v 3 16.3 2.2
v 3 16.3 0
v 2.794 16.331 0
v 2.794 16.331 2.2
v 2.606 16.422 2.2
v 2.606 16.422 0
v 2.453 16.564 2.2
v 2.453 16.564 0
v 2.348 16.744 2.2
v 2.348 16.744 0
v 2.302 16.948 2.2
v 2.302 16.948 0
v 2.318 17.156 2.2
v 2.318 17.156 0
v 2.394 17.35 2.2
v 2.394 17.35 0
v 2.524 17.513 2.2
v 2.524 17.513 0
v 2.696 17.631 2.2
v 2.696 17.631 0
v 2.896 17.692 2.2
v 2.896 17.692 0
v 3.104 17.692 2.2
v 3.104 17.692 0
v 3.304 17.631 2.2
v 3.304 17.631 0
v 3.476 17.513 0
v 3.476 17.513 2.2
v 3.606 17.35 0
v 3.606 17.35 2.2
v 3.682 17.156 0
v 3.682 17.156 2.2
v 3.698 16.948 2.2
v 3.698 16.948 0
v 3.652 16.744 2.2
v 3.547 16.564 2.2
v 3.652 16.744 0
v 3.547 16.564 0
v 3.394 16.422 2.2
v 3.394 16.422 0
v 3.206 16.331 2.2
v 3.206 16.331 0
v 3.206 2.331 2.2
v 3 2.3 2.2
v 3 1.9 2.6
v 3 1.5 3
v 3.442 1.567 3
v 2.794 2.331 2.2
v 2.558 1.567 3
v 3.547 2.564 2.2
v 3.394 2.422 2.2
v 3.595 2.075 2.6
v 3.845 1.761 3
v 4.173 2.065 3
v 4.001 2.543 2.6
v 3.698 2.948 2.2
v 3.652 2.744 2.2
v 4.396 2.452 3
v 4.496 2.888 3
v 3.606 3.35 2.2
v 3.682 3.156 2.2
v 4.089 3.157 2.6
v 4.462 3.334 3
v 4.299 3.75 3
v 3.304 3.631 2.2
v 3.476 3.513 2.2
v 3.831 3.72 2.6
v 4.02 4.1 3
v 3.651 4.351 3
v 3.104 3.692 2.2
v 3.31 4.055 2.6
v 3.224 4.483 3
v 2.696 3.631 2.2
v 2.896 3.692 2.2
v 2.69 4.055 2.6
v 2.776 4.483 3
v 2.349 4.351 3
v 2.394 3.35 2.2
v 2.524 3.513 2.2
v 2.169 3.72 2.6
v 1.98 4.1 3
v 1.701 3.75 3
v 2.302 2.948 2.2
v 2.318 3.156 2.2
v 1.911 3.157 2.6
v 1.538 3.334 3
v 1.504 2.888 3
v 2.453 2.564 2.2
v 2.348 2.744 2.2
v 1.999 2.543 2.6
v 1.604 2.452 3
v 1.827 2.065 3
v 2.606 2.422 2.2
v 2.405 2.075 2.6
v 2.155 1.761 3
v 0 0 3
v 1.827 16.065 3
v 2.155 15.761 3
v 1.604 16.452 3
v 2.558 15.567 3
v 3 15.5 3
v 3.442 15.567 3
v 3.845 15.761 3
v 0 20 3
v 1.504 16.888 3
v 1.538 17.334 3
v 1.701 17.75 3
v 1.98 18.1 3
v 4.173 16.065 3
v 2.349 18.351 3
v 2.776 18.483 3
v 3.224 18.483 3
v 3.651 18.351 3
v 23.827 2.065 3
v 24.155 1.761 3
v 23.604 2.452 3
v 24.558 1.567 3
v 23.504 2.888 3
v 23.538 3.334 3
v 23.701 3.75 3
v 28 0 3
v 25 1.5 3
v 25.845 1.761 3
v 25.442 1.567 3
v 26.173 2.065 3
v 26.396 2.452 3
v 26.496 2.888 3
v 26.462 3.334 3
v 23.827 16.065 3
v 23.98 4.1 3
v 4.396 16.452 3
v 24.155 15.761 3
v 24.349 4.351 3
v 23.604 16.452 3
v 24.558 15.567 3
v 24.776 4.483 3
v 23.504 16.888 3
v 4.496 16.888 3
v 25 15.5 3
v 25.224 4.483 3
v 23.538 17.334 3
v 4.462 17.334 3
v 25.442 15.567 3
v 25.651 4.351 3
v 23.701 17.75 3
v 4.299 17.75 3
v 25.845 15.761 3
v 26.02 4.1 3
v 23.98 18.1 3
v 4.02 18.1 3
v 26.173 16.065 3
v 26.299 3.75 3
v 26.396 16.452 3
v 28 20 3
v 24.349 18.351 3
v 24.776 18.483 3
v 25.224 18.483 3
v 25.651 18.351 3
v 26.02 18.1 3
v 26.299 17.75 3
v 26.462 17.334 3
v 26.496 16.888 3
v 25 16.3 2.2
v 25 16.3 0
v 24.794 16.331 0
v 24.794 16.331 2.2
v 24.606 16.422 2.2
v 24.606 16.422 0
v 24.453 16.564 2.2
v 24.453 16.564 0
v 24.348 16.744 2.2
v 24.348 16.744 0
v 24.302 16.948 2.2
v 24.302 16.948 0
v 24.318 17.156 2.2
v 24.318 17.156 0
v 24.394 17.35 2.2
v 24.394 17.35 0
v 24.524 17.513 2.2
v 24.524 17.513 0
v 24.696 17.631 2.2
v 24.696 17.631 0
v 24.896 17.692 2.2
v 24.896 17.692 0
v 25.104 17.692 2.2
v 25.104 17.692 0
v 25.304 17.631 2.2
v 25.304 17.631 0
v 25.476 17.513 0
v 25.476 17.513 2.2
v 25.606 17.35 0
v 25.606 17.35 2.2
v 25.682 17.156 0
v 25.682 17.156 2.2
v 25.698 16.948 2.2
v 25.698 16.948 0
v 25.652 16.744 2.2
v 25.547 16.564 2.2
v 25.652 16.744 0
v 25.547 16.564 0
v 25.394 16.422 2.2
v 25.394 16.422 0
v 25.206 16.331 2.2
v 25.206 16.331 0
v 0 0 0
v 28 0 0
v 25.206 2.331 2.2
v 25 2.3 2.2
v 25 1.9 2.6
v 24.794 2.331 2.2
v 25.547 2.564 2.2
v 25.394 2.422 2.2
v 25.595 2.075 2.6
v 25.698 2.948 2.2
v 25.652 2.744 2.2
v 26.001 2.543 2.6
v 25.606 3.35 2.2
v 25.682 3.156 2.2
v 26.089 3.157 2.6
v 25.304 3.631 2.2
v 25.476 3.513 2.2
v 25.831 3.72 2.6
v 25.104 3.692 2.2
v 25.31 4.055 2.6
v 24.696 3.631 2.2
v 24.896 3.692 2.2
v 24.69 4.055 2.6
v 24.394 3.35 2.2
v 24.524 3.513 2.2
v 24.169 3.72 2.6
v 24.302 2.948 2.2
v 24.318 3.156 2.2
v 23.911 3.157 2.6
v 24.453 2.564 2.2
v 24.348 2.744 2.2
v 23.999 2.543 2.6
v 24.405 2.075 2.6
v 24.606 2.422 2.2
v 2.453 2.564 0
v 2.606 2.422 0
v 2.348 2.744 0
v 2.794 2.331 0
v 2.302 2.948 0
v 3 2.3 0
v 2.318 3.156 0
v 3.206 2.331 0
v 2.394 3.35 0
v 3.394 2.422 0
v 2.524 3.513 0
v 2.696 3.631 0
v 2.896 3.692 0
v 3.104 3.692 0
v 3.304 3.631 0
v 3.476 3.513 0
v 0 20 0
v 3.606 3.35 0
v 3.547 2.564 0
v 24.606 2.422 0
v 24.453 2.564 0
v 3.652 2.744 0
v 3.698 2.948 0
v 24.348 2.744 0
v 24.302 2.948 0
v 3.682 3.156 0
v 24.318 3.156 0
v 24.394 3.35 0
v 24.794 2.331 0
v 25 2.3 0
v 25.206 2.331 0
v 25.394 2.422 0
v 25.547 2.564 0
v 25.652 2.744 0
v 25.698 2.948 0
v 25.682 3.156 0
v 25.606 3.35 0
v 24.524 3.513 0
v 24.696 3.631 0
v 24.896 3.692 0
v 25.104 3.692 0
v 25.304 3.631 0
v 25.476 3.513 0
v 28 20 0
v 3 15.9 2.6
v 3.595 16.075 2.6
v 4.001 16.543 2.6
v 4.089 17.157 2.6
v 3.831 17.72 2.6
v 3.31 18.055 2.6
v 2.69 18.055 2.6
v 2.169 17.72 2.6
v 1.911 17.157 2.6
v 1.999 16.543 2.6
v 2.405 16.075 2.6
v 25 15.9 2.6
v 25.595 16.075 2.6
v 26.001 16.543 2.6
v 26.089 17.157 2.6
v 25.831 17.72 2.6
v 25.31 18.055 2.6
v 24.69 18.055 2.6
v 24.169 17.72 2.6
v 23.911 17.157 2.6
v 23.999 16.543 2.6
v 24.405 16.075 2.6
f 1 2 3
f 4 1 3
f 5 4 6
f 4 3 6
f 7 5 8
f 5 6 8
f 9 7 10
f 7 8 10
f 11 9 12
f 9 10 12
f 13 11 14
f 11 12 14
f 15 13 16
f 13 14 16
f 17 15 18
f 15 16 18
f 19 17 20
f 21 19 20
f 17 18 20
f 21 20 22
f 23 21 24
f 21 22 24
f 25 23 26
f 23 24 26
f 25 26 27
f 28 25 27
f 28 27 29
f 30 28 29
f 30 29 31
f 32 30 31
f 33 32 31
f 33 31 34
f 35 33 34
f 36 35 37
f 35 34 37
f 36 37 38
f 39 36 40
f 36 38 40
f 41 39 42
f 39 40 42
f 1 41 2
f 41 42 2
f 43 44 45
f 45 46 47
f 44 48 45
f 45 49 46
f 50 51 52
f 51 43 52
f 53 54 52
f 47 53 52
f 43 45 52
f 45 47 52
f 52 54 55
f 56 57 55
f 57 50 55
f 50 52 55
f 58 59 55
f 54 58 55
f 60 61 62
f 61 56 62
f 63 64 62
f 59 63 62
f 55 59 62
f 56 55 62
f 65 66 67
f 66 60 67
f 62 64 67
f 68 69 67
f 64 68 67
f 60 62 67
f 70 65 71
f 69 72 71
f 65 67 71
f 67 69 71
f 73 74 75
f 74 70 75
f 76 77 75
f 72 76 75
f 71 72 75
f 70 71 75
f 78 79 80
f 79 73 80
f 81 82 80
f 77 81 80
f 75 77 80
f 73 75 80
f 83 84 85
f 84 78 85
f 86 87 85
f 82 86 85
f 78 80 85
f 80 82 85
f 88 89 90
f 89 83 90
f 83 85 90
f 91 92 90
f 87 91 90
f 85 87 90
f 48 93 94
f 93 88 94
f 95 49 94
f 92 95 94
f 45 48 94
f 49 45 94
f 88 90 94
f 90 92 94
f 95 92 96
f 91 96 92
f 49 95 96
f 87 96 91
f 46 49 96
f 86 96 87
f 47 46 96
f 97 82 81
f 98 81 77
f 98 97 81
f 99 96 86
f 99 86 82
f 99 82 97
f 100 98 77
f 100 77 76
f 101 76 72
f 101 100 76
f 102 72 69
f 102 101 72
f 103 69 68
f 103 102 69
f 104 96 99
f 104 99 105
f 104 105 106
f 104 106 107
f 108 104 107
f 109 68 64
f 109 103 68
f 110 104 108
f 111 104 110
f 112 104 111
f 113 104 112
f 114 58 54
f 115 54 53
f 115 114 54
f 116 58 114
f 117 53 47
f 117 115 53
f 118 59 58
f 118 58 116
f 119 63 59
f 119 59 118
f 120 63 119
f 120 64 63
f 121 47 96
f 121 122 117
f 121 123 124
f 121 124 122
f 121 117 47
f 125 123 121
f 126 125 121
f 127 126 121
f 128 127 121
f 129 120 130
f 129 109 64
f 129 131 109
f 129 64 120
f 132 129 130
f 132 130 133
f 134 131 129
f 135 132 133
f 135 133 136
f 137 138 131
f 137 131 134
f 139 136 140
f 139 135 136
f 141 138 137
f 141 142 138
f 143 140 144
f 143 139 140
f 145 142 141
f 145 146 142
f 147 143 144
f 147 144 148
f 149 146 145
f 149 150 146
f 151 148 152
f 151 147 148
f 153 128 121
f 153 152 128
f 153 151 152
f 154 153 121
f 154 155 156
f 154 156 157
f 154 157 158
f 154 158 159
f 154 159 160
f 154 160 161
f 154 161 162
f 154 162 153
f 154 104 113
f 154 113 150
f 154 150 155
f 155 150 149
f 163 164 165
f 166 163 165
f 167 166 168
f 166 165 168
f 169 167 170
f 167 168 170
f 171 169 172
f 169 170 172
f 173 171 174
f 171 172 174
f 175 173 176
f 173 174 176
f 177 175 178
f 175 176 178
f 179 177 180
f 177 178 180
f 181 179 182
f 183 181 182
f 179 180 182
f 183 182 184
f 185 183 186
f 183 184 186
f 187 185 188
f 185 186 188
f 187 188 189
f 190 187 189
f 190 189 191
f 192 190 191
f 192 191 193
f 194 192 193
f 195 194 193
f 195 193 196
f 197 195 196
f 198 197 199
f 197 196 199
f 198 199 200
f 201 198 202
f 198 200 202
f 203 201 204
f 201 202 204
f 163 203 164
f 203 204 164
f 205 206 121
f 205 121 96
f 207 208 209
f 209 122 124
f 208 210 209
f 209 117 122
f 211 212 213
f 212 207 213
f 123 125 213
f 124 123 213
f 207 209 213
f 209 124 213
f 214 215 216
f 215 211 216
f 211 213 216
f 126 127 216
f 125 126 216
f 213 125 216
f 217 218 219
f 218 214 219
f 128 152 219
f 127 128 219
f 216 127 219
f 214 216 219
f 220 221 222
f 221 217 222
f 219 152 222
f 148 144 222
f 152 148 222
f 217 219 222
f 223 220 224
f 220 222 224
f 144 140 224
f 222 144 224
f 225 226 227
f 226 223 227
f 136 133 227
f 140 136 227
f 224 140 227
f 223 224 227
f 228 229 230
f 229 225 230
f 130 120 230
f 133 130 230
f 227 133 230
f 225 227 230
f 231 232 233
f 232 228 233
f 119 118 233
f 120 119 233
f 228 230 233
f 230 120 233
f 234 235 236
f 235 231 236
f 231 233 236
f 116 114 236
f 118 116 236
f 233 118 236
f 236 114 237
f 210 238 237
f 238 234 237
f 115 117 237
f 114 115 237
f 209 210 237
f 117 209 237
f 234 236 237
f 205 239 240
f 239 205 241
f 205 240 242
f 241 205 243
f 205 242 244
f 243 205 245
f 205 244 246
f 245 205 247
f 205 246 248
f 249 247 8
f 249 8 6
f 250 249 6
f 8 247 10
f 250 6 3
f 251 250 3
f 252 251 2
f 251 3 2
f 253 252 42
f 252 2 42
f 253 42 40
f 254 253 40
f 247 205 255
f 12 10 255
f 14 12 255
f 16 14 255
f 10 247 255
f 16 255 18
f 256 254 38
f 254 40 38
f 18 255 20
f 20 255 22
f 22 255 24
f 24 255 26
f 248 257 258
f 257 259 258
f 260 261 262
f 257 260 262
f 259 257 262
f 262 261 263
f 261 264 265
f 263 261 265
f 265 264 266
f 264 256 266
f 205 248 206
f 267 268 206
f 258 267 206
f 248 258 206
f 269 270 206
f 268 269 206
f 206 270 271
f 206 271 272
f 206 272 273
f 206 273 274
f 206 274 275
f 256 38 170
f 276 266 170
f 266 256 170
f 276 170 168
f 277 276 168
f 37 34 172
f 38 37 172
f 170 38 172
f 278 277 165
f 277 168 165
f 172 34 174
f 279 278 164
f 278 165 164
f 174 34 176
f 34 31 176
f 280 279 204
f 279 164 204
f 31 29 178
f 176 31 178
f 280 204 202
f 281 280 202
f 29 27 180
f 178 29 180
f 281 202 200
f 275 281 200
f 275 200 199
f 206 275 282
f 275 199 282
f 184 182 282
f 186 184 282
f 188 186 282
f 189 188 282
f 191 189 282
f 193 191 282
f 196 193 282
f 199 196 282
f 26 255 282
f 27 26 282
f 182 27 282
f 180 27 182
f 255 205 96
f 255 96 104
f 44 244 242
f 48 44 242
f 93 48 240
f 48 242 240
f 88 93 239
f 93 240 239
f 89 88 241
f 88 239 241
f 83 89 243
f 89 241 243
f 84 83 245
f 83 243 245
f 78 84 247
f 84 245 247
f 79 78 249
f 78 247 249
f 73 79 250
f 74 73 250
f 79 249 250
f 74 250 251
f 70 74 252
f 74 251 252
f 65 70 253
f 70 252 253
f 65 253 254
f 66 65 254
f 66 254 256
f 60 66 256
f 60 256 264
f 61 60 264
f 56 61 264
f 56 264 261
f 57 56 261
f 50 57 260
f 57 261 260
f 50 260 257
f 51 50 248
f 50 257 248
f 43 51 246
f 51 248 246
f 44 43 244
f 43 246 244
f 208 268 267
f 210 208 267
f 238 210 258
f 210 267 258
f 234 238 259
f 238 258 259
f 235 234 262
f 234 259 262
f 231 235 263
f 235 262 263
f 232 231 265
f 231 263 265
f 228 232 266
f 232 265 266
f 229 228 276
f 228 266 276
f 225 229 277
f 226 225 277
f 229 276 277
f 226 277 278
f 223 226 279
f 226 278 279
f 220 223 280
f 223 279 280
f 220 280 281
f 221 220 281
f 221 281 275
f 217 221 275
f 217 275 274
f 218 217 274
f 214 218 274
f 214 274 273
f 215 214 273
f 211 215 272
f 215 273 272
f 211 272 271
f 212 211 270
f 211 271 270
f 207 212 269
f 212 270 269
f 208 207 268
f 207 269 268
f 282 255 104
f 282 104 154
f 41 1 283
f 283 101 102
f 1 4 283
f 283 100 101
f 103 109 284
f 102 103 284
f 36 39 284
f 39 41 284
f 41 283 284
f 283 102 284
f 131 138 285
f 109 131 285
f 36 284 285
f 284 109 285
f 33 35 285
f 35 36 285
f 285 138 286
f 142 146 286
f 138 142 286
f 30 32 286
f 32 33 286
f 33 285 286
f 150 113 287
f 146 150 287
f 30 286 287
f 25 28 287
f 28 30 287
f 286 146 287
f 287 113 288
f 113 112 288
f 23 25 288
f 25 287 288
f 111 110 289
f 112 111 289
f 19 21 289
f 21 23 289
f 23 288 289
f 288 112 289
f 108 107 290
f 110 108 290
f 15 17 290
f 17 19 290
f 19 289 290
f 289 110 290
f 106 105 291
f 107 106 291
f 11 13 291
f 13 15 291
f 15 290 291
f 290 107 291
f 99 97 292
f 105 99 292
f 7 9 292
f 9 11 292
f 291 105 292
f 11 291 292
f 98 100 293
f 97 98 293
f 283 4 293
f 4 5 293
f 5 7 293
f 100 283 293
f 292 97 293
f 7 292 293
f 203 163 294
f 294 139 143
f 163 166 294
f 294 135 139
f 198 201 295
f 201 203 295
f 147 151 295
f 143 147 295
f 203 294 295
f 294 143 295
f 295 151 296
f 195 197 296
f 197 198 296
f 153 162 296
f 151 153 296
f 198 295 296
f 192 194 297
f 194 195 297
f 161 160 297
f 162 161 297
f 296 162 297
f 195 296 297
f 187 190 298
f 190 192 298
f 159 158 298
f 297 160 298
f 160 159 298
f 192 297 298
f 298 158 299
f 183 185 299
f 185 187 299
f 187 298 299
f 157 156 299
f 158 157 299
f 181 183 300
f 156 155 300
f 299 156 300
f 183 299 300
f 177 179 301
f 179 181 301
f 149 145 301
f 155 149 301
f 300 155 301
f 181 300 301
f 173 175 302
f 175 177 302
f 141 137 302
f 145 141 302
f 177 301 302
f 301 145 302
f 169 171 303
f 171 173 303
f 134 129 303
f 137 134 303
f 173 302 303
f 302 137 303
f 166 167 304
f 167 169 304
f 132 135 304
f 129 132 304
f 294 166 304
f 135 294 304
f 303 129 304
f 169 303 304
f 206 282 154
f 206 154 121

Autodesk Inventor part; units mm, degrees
ref_plane "XZ Plane" through (0, 0, 0) normal (0, 1, 0) x (-1, 0, 0)
ref_plane "XY Plane" through (0, 0, 0) normal (0, 0, 1) x (1, 0, 0)
sketch "Skizze1" plane through (0, 0, 0) normal (0, 0, 1) x (1, 0, 0)
  line L0 (0, 20) -> (28, 20)
  line L1 (28, 20) -> (28, 0)
  line L2 (28, 0) -> (0, 0)
  line L3 (0, 0) -> (0, 20)
  dimension "d0" = 28
  dimension "d1" = 20
extrude "Extrusion1" add sketch "Skizze1" along normal blind 3
sketch "Skizze2" plane through (0, 0, 3) normal (0, 0, 1) x (1, 0, 0)
  line L0 (0, 20) -> (0, 0) projected
  line L1 (0, 10) -> (28.5763, 10) construction
  line L2 (28, 0) -> (28, 20) projected
  point P0 (3, 17)
  point P1 (3, 3)
  point P2 (25, 17)
  point P3 (25, 3)
  dimension "d4" = 14
  dimension "d5" = 3
  dimension "d14" = 3
hole "Bohrung1" at (3, 17, 3) at (3, 3, 3) at (25, 3, 3) at (25, 17, 3) direction (0, 0, -1) diameter 1.4 end through all countersink diameter 3 countersink angle 90
ref_plane "Arbeitsebene1" through (14, 0, 0) normal (1, 0, 0) x (0, 1, 0)
properties part number "Zylinderkopf" material "Stahl, galvanisiert"
